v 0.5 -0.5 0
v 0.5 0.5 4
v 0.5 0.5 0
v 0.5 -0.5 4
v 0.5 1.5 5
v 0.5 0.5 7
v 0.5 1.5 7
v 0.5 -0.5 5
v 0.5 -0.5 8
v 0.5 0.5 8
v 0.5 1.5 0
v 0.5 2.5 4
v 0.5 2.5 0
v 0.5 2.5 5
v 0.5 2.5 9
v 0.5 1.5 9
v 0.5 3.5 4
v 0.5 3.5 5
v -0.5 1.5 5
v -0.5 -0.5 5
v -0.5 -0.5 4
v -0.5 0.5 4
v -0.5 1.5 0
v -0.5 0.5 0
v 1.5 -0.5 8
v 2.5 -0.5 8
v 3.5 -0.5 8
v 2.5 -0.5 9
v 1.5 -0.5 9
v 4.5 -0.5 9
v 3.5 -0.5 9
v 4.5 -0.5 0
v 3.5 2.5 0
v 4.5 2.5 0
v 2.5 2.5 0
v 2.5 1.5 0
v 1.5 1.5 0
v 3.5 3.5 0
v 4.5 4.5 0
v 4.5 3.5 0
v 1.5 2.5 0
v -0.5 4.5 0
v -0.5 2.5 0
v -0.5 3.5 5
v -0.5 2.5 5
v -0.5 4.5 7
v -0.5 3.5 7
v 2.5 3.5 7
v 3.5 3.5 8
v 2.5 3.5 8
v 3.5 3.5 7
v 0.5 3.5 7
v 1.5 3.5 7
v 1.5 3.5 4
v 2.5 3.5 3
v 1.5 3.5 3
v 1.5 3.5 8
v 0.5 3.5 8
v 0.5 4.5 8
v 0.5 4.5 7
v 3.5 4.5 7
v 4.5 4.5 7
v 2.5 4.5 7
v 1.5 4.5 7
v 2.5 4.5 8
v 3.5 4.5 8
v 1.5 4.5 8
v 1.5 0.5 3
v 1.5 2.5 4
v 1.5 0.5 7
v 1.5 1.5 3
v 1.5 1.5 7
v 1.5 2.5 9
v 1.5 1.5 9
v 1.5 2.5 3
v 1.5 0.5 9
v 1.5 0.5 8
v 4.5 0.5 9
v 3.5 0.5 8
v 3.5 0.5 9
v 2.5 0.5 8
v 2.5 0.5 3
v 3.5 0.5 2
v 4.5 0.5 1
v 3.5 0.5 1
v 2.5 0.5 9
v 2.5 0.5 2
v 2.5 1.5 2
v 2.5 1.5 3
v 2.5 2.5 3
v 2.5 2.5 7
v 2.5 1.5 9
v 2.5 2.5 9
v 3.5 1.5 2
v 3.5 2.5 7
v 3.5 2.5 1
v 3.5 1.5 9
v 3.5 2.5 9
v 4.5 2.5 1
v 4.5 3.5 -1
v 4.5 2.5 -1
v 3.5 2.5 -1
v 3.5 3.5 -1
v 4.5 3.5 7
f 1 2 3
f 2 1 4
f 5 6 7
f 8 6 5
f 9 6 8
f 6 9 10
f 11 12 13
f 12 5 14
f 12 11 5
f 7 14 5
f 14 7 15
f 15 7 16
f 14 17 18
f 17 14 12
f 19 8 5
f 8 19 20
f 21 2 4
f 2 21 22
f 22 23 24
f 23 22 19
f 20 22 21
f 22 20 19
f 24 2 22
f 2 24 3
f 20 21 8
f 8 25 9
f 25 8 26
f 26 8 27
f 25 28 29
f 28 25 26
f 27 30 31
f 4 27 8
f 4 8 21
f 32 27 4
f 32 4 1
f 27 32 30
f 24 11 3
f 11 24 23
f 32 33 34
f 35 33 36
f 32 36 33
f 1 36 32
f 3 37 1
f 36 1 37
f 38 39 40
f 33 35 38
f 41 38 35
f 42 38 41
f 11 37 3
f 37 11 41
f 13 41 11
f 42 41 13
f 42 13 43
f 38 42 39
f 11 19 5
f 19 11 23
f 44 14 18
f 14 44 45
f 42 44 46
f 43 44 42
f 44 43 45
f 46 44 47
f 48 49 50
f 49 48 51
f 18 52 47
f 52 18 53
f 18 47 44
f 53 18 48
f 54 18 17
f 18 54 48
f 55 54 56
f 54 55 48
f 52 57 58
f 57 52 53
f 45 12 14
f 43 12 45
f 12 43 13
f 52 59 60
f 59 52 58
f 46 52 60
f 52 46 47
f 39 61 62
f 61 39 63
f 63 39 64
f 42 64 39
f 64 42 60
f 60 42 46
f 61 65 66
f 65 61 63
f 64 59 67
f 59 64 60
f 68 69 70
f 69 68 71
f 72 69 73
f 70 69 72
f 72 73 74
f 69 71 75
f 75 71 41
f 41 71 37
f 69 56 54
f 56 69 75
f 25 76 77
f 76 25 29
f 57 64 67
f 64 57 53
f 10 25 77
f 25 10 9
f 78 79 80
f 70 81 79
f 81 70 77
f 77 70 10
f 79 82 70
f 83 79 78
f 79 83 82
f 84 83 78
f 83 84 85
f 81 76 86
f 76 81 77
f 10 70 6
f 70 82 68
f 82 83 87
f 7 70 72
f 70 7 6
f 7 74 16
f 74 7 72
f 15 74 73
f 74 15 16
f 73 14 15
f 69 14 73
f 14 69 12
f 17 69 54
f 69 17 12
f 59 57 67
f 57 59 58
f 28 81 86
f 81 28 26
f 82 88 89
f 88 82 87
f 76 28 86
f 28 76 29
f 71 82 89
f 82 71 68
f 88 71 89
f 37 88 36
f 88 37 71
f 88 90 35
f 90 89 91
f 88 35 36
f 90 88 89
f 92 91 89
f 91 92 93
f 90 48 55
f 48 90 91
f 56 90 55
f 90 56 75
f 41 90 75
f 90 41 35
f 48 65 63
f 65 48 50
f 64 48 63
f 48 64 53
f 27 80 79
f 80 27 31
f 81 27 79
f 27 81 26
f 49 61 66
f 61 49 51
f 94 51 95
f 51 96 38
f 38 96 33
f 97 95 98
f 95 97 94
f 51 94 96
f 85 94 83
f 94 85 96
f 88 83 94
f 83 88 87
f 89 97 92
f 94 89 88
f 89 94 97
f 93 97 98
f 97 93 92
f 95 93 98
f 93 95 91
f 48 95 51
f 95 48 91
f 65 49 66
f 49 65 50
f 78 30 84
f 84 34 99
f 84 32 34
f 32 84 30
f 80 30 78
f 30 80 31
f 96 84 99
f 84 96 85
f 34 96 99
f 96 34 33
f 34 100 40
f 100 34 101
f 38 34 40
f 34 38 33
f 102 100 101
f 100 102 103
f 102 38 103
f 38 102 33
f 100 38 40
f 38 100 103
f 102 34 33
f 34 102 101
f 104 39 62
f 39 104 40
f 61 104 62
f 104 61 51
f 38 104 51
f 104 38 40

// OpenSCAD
union() {
    translate([0, 0, 4.5]) color([1, 0, 0]) cube([1, 1, 1], center=true);
    translate([0, 1, 2.5]) cube([1, 1, 5], center=true);
    translate([0, 3, 2.5]) cube([1, 1, 5], center=true);
    translate([0, 4, 3.5]) cube([1, 1, 7], center=true);
    translate([1, 0, 4.0]) cube([1, 1, 8], center=true);
    translate([1, 1, 3.5]) cube([1, 1, 7], center=true);
    translate([1, 2, 4.5]) cube([1, 1, 9], center=true);
    translate([1, 3, 2.0]) cube([1, 1, 4], center=true);
    translate([1, 4, 4.0]) cube([1, 1, 8], center=true);
    translate([2, 0, 4.5]) cube([1, 1, 9], center=true);
    translate([2, 1, 1.5]) cube([1, 1, 3], center=true);
    translate([2, 3, 1.5]) cube([1, 1, 3], center=true);
    translate([2, 4, 3.5]) cube([1, 1, 7], center=true);
    translate([3, 0, 4.0]) cube([1, 1, 8], center=true);
    translate([3, 1, 1.0]) cube([1, 1, 2], center=true);
    translate([3, 2, 4.5]) cube([1, 1, 9], center=true);
    translate([3, 3, 3.5]) cube([1, 1, 7], center=true);
    translate([3, 4, 4.0]) cube([1, 1, 8], center=true);
    translate([4, 0, 4.5]) cube([1, 1, 9], center=true);
    translate([4, 1, 0.5]) cube([1, 1, 1], center=true);
    translate([4, 2, 0.5]) cube([1, 1, 1], center=true);
    translate([4, 3, -0.5]) color([0, 0, 1]) cube([1, 1, 1], center=true);
    translate([4, 4, 3.5]) cube([1, 1, 7], center=true);
}
